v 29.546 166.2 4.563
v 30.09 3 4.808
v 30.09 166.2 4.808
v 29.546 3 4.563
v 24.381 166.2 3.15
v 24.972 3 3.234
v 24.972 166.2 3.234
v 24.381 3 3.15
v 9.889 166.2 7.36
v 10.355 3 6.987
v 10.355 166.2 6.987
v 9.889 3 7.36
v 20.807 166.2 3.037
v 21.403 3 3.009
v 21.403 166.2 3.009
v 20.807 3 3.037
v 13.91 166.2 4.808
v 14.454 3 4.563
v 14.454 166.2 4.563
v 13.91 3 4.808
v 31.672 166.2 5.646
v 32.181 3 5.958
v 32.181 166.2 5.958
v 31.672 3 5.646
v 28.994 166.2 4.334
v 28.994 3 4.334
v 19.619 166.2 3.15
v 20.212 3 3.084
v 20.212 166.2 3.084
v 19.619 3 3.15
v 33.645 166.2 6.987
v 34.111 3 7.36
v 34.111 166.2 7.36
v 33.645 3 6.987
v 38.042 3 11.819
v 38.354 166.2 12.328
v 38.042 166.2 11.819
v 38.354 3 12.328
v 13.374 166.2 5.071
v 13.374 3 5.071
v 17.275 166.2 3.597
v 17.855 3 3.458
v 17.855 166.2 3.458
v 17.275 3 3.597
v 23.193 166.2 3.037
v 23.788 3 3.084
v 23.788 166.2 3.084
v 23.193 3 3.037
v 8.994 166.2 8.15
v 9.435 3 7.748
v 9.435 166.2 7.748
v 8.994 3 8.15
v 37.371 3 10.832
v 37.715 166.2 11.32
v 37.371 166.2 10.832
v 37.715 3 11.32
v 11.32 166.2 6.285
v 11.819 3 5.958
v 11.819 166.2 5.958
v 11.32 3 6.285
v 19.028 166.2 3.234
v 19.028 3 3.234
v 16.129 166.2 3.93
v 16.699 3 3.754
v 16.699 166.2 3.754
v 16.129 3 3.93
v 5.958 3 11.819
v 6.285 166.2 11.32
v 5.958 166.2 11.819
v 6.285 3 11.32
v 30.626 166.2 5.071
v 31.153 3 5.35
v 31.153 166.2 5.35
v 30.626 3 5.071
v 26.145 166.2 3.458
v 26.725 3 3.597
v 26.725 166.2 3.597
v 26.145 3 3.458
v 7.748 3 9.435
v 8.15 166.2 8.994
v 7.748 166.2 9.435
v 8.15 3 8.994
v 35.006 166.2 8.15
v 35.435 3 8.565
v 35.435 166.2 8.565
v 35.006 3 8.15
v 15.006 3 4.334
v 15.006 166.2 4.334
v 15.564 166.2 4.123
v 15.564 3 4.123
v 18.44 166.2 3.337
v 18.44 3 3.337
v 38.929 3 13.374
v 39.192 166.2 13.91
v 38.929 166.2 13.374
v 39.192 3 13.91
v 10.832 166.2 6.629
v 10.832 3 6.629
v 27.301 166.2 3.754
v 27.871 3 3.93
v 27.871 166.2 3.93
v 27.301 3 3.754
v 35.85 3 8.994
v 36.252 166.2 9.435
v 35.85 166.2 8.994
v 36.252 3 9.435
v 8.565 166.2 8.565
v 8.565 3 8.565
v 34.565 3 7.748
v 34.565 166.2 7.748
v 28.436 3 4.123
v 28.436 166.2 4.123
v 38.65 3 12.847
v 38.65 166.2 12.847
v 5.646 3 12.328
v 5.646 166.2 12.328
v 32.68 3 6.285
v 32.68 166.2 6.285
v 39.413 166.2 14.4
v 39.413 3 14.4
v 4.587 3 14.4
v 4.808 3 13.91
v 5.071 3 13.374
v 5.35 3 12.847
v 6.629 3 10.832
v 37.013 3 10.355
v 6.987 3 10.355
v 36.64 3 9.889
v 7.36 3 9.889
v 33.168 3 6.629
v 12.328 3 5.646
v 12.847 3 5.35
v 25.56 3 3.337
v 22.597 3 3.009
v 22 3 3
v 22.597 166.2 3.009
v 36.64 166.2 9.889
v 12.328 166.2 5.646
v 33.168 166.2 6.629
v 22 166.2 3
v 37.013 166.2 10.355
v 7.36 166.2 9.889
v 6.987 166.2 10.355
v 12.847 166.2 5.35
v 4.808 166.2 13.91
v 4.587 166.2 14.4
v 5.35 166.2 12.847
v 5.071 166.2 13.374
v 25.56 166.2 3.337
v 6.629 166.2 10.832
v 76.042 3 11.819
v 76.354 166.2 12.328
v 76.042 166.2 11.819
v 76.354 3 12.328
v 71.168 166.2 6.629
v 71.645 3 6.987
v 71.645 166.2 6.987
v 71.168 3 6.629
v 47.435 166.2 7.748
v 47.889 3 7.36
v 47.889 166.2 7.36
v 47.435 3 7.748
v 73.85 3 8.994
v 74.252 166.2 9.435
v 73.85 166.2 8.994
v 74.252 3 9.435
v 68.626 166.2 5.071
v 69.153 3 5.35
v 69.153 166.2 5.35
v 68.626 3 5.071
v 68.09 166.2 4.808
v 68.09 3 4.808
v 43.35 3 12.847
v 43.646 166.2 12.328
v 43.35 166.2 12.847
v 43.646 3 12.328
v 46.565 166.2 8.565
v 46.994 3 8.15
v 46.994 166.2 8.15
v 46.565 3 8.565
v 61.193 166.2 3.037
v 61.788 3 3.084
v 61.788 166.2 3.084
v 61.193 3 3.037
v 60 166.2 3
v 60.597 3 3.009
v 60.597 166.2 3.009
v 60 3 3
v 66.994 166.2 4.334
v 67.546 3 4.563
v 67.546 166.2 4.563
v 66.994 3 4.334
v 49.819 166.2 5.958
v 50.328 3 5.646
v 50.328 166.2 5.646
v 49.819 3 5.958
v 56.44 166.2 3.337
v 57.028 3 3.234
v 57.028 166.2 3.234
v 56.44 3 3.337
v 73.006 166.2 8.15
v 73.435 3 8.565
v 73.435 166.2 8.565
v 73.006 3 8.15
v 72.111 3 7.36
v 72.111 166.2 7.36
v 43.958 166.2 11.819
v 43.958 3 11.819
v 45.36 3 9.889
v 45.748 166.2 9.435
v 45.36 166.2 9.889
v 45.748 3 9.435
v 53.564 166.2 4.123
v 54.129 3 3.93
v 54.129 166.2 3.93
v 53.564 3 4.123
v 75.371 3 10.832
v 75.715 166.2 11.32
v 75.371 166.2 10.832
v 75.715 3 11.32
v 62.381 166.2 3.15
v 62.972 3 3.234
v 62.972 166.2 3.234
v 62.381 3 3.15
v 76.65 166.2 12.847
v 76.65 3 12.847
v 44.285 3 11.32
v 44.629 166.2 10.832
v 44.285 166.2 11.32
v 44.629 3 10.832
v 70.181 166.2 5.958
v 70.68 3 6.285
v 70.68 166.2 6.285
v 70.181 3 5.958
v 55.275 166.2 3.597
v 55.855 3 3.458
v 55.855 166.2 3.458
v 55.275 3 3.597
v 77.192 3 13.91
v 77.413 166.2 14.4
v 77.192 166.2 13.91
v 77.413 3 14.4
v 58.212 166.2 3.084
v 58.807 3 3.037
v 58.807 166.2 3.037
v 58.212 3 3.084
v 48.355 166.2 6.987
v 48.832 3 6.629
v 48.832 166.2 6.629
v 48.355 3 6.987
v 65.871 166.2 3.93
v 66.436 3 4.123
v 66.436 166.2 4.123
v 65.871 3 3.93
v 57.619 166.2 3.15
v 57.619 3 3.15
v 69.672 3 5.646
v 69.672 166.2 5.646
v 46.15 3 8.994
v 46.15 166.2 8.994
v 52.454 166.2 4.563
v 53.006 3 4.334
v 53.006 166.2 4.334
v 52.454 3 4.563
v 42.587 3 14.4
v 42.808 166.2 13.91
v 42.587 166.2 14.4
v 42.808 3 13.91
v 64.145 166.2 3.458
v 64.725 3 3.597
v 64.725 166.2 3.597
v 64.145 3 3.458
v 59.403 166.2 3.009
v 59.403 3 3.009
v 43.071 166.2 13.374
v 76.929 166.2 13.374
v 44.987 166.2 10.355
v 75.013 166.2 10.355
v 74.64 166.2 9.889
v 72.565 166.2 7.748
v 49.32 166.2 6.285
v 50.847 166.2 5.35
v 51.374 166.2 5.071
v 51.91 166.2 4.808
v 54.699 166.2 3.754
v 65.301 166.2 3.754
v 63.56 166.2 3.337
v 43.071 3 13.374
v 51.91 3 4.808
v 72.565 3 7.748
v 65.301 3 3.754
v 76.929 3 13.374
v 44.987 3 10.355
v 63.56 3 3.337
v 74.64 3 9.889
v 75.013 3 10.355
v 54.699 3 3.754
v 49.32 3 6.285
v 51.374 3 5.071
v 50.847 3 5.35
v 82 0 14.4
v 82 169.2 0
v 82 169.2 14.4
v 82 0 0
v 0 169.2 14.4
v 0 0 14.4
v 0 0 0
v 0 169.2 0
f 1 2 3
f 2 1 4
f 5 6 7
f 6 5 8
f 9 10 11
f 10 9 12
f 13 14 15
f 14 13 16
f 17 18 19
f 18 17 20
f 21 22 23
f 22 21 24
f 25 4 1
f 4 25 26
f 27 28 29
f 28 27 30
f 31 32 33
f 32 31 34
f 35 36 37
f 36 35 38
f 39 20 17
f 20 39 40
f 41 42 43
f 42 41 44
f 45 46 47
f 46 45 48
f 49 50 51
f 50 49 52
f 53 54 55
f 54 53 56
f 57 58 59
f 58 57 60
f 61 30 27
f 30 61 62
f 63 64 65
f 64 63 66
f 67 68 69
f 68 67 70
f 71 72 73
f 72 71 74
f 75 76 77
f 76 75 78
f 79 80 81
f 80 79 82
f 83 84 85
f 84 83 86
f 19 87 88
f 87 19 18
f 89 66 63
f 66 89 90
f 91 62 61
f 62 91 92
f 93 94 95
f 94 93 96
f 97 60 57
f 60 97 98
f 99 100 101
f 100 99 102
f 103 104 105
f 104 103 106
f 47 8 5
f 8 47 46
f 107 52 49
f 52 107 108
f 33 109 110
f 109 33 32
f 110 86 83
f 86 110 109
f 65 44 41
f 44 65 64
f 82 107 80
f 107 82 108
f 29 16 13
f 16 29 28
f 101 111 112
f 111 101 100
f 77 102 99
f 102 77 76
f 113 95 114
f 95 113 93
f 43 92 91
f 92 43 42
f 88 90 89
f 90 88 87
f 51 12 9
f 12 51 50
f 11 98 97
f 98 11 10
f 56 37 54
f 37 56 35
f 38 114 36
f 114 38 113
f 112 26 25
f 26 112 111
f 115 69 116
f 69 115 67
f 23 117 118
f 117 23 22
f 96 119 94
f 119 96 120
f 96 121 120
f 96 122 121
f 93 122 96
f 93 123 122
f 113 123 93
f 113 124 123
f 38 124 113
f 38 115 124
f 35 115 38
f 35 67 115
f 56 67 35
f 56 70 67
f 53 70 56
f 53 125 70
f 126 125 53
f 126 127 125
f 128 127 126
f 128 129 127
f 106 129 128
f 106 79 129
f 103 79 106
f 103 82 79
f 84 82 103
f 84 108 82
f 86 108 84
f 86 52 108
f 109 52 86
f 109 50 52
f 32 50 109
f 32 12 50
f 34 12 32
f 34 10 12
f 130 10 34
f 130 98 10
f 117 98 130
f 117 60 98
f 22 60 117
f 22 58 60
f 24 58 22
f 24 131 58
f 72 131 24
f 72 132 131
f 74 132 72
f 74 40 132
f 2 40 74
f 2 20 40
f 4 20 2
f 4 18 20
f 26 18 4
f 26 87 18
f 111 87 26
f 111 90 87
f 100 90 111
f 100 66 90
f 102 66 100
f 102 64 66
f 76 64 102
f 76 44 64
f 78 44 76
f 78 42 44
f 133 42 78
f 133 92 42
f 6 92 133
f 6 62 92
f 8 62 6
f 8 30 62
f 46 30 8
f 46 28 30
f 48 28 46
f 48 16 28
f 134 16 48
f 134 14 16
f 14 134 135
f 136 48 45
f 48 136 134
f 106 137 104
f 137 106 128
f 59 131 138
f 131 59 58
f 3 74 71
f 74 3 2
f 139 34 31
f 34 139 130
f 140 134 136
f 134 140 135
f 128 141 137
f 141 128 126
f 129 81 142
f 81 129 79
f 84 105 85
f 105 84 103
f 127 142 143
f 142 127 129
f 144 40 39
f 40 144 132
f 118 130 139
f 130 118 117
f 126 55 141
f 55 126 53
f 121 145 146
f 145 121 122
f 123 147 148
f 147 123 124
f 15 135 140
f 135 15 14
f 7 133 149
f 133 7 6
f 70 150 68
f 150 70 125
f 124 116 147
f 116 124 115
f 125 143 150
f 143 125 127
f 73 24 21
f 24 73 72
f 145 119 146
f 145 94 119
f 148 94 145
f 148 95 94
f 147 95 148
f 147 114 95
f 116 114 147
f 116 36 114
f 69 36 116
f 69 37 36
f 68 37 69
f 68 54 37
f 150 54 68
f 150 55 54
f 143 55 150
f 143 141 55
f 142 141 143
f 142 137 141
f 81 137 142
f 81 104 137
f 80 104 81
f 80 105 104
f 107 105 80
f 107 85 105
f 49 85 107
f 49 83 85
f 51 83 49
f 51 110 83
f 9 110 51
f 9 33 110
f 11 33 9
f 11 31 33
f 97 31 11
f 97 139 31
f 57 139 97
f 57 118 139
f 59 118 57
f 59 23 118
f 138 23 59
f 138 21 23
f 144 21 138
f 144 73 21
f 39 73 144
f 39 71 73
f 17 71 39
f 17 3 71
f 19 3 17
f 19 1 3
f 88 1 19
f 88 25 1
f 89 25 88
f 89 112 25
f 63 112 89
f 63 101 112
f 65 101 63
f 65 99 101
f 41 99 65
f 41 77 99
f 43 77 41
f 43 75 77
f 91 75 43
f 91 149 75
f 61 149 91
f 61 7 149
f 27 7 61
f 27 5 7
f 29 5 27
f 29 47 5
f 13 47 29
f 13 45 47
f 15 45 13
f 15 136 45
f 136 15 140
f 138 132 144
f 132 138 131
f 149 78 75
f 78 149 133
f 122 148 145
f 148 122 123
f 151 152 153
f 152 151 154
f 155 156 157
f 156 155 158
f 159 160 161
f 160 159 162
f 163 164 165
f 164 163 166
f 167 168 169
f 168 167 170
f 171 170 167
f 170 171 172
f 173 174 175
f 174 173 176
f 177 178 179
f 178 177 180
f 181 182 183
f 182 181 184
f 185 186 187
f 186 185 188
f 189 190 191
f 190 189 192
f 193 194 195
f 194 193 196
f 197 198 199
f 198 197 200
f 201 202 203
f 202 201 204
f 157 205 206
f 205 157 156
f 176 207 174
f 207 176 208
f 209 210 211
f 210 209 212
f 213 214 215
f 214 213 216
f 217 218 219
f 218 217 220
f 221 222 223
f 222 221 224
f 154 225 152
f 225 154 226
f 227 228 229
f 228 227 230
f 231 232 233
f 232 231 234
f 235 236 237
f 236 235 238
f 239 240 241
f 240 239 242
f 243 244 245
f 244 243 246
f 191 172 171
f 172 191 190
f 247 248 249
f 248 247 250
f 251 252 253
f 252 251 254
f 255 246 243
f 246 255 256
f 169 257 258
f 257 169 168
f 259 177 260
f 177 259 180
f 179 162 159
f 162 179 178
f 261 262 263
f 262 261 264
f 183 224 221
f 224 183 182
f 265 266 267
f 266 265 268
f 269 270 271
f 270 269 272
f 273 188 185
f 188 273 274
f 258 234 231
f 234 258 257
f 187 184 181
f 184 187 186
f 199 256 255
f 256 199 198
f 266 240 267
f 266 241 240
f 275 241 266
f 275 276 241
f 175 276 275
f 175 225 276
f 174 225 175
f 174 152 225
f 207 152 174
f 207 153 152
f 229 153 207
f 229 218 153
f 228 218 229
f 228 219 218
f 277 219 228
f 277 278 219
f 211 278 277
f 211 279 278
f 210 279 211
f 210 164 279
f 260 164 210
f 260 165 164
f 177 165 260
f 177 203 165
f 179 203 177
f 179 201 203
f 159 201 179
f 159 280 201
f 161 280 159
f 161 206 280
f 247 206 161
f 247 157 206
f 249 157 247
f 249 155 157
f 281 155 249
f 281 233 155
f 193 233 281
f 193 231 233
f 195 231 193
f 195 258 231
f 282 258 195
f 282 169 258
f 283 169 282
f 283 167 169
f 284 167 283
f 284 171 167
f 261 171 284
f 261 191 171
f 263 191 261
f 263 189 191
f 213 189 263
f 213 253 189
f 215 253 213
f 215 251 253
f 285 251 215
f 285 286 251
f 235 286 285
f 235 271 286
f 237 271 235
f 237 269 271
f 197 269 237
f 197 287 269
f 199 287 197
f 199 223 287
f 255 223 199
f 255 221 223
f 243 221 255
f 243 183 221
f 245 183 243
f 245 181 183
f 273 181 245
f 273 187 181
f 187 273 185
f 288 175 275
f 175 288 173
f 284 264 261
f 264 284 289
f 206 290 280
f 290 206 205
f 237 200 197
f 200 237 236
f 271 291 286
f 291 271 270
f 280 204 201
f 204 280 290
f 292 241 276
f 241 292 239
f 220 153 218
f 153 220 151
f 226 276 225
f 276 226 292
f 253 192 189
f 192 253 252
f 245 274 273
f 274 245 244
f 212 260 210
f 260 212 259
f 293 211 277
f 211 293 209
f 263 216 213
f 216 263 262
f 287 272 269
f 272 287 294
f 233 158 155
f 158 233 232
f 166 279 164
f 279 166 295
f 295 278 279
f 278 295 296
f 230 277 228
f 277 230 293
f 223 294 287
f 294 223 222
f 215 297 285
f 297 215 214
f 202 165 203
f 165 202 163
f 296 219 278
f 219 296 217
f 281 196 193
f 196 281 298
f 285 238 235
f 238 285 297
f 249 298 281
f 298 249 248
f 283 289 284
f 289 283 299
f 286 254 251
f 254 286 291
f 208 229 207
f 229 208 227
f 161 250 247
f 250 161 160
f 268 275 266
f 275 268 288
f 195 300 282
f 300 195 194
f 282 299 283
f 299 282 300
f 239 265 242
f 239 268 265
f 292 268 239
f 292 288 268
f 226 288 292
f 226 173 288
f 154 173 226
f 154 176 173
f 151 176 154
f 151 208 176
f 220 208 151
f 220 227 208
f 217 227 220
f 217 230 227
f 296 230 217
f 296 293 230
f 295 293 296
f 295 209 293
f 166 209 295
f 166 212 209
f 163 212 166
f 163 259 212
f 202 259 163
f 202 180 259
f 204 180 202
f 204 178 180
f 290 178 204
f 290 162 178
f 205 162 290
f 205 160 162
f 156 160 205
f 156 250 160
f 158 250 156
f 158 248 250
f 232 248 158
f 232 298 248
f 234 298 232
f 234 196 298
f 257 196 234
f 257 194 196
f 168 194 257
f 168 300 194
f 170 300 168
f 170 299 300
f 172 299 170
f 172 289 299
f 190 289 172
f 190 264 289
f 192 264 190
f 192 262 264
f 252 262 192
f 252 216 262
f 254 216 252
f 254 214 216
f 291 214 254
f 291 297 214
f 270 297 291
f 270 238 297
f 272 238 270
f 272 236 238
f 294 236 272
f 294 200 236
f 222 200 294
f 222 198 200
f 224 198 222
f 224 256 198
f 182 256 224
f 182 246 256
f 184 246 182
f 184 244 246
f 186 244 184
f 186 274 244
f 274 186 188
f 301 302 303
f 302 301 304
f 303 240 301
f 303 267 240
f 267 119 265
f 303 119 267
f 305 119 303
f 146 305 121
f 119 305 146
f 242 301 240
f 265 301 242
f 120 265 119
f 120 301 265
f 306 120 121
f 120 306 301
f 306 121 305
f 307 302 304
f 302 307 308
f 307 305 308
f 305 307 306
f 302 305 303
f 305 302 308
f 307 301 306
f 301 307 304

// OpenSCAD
//=============================================================================
// tealight-tray.scad
//
// A simple tray for storing tealights, keeping them from rolling around.
//=============================================================================
// Written in 2017 by Patrick Barrett
//
// To the extent possible under law, the author(s) have dedicated all copyright
// and related and neighboring rights to this work to the public domain
// worldwide. This work is distributed without any warranty.
//
// See <http://creativecommons.org/publicdomain/zero/1.0/> for full dedication.
//=============================================================================

candledia = 38;
candleheight = 13.6;
candlerows = 2;
candlecols = 12;
depthpercent = 30;

minwall = 3;

// customizable variables end here

abit = 0.001; //use for making overlap to get single manifold stl
alot = 150;

$fn = 200;

bw = candlerows * candledia + 2*minwall;
bl = candlecols * candleheight + 2*minwall;
bh = (depthpercent/100) * candledia + minwall;

candlerowlen = candleheight * candlecols;

if(depthpercent>50 || depthpercent<0){
    echo("<font color='red'>ERROR: depthpercent has to be an integer in the range 0-50 (%)</font>");
    assert(false);
}

module donut(d, h) {
    translate([0,0,h/2])
    rotate_extrude()
    translate([d/2-h/2, 0, 0])
    circle(d = h);
}
// main body
difference() {
    cube([bw, bl, bh]);
    
    for(i = [0:candlerows-1]) {
        translate([candledia*i, 0, 0])
        translate([candledia/2 + minwall, minwall, candledia/2 + minwall])
        rotate([-90,0,0])
        cylinder(h = candlerowlen, d = candledia);
    }
}
